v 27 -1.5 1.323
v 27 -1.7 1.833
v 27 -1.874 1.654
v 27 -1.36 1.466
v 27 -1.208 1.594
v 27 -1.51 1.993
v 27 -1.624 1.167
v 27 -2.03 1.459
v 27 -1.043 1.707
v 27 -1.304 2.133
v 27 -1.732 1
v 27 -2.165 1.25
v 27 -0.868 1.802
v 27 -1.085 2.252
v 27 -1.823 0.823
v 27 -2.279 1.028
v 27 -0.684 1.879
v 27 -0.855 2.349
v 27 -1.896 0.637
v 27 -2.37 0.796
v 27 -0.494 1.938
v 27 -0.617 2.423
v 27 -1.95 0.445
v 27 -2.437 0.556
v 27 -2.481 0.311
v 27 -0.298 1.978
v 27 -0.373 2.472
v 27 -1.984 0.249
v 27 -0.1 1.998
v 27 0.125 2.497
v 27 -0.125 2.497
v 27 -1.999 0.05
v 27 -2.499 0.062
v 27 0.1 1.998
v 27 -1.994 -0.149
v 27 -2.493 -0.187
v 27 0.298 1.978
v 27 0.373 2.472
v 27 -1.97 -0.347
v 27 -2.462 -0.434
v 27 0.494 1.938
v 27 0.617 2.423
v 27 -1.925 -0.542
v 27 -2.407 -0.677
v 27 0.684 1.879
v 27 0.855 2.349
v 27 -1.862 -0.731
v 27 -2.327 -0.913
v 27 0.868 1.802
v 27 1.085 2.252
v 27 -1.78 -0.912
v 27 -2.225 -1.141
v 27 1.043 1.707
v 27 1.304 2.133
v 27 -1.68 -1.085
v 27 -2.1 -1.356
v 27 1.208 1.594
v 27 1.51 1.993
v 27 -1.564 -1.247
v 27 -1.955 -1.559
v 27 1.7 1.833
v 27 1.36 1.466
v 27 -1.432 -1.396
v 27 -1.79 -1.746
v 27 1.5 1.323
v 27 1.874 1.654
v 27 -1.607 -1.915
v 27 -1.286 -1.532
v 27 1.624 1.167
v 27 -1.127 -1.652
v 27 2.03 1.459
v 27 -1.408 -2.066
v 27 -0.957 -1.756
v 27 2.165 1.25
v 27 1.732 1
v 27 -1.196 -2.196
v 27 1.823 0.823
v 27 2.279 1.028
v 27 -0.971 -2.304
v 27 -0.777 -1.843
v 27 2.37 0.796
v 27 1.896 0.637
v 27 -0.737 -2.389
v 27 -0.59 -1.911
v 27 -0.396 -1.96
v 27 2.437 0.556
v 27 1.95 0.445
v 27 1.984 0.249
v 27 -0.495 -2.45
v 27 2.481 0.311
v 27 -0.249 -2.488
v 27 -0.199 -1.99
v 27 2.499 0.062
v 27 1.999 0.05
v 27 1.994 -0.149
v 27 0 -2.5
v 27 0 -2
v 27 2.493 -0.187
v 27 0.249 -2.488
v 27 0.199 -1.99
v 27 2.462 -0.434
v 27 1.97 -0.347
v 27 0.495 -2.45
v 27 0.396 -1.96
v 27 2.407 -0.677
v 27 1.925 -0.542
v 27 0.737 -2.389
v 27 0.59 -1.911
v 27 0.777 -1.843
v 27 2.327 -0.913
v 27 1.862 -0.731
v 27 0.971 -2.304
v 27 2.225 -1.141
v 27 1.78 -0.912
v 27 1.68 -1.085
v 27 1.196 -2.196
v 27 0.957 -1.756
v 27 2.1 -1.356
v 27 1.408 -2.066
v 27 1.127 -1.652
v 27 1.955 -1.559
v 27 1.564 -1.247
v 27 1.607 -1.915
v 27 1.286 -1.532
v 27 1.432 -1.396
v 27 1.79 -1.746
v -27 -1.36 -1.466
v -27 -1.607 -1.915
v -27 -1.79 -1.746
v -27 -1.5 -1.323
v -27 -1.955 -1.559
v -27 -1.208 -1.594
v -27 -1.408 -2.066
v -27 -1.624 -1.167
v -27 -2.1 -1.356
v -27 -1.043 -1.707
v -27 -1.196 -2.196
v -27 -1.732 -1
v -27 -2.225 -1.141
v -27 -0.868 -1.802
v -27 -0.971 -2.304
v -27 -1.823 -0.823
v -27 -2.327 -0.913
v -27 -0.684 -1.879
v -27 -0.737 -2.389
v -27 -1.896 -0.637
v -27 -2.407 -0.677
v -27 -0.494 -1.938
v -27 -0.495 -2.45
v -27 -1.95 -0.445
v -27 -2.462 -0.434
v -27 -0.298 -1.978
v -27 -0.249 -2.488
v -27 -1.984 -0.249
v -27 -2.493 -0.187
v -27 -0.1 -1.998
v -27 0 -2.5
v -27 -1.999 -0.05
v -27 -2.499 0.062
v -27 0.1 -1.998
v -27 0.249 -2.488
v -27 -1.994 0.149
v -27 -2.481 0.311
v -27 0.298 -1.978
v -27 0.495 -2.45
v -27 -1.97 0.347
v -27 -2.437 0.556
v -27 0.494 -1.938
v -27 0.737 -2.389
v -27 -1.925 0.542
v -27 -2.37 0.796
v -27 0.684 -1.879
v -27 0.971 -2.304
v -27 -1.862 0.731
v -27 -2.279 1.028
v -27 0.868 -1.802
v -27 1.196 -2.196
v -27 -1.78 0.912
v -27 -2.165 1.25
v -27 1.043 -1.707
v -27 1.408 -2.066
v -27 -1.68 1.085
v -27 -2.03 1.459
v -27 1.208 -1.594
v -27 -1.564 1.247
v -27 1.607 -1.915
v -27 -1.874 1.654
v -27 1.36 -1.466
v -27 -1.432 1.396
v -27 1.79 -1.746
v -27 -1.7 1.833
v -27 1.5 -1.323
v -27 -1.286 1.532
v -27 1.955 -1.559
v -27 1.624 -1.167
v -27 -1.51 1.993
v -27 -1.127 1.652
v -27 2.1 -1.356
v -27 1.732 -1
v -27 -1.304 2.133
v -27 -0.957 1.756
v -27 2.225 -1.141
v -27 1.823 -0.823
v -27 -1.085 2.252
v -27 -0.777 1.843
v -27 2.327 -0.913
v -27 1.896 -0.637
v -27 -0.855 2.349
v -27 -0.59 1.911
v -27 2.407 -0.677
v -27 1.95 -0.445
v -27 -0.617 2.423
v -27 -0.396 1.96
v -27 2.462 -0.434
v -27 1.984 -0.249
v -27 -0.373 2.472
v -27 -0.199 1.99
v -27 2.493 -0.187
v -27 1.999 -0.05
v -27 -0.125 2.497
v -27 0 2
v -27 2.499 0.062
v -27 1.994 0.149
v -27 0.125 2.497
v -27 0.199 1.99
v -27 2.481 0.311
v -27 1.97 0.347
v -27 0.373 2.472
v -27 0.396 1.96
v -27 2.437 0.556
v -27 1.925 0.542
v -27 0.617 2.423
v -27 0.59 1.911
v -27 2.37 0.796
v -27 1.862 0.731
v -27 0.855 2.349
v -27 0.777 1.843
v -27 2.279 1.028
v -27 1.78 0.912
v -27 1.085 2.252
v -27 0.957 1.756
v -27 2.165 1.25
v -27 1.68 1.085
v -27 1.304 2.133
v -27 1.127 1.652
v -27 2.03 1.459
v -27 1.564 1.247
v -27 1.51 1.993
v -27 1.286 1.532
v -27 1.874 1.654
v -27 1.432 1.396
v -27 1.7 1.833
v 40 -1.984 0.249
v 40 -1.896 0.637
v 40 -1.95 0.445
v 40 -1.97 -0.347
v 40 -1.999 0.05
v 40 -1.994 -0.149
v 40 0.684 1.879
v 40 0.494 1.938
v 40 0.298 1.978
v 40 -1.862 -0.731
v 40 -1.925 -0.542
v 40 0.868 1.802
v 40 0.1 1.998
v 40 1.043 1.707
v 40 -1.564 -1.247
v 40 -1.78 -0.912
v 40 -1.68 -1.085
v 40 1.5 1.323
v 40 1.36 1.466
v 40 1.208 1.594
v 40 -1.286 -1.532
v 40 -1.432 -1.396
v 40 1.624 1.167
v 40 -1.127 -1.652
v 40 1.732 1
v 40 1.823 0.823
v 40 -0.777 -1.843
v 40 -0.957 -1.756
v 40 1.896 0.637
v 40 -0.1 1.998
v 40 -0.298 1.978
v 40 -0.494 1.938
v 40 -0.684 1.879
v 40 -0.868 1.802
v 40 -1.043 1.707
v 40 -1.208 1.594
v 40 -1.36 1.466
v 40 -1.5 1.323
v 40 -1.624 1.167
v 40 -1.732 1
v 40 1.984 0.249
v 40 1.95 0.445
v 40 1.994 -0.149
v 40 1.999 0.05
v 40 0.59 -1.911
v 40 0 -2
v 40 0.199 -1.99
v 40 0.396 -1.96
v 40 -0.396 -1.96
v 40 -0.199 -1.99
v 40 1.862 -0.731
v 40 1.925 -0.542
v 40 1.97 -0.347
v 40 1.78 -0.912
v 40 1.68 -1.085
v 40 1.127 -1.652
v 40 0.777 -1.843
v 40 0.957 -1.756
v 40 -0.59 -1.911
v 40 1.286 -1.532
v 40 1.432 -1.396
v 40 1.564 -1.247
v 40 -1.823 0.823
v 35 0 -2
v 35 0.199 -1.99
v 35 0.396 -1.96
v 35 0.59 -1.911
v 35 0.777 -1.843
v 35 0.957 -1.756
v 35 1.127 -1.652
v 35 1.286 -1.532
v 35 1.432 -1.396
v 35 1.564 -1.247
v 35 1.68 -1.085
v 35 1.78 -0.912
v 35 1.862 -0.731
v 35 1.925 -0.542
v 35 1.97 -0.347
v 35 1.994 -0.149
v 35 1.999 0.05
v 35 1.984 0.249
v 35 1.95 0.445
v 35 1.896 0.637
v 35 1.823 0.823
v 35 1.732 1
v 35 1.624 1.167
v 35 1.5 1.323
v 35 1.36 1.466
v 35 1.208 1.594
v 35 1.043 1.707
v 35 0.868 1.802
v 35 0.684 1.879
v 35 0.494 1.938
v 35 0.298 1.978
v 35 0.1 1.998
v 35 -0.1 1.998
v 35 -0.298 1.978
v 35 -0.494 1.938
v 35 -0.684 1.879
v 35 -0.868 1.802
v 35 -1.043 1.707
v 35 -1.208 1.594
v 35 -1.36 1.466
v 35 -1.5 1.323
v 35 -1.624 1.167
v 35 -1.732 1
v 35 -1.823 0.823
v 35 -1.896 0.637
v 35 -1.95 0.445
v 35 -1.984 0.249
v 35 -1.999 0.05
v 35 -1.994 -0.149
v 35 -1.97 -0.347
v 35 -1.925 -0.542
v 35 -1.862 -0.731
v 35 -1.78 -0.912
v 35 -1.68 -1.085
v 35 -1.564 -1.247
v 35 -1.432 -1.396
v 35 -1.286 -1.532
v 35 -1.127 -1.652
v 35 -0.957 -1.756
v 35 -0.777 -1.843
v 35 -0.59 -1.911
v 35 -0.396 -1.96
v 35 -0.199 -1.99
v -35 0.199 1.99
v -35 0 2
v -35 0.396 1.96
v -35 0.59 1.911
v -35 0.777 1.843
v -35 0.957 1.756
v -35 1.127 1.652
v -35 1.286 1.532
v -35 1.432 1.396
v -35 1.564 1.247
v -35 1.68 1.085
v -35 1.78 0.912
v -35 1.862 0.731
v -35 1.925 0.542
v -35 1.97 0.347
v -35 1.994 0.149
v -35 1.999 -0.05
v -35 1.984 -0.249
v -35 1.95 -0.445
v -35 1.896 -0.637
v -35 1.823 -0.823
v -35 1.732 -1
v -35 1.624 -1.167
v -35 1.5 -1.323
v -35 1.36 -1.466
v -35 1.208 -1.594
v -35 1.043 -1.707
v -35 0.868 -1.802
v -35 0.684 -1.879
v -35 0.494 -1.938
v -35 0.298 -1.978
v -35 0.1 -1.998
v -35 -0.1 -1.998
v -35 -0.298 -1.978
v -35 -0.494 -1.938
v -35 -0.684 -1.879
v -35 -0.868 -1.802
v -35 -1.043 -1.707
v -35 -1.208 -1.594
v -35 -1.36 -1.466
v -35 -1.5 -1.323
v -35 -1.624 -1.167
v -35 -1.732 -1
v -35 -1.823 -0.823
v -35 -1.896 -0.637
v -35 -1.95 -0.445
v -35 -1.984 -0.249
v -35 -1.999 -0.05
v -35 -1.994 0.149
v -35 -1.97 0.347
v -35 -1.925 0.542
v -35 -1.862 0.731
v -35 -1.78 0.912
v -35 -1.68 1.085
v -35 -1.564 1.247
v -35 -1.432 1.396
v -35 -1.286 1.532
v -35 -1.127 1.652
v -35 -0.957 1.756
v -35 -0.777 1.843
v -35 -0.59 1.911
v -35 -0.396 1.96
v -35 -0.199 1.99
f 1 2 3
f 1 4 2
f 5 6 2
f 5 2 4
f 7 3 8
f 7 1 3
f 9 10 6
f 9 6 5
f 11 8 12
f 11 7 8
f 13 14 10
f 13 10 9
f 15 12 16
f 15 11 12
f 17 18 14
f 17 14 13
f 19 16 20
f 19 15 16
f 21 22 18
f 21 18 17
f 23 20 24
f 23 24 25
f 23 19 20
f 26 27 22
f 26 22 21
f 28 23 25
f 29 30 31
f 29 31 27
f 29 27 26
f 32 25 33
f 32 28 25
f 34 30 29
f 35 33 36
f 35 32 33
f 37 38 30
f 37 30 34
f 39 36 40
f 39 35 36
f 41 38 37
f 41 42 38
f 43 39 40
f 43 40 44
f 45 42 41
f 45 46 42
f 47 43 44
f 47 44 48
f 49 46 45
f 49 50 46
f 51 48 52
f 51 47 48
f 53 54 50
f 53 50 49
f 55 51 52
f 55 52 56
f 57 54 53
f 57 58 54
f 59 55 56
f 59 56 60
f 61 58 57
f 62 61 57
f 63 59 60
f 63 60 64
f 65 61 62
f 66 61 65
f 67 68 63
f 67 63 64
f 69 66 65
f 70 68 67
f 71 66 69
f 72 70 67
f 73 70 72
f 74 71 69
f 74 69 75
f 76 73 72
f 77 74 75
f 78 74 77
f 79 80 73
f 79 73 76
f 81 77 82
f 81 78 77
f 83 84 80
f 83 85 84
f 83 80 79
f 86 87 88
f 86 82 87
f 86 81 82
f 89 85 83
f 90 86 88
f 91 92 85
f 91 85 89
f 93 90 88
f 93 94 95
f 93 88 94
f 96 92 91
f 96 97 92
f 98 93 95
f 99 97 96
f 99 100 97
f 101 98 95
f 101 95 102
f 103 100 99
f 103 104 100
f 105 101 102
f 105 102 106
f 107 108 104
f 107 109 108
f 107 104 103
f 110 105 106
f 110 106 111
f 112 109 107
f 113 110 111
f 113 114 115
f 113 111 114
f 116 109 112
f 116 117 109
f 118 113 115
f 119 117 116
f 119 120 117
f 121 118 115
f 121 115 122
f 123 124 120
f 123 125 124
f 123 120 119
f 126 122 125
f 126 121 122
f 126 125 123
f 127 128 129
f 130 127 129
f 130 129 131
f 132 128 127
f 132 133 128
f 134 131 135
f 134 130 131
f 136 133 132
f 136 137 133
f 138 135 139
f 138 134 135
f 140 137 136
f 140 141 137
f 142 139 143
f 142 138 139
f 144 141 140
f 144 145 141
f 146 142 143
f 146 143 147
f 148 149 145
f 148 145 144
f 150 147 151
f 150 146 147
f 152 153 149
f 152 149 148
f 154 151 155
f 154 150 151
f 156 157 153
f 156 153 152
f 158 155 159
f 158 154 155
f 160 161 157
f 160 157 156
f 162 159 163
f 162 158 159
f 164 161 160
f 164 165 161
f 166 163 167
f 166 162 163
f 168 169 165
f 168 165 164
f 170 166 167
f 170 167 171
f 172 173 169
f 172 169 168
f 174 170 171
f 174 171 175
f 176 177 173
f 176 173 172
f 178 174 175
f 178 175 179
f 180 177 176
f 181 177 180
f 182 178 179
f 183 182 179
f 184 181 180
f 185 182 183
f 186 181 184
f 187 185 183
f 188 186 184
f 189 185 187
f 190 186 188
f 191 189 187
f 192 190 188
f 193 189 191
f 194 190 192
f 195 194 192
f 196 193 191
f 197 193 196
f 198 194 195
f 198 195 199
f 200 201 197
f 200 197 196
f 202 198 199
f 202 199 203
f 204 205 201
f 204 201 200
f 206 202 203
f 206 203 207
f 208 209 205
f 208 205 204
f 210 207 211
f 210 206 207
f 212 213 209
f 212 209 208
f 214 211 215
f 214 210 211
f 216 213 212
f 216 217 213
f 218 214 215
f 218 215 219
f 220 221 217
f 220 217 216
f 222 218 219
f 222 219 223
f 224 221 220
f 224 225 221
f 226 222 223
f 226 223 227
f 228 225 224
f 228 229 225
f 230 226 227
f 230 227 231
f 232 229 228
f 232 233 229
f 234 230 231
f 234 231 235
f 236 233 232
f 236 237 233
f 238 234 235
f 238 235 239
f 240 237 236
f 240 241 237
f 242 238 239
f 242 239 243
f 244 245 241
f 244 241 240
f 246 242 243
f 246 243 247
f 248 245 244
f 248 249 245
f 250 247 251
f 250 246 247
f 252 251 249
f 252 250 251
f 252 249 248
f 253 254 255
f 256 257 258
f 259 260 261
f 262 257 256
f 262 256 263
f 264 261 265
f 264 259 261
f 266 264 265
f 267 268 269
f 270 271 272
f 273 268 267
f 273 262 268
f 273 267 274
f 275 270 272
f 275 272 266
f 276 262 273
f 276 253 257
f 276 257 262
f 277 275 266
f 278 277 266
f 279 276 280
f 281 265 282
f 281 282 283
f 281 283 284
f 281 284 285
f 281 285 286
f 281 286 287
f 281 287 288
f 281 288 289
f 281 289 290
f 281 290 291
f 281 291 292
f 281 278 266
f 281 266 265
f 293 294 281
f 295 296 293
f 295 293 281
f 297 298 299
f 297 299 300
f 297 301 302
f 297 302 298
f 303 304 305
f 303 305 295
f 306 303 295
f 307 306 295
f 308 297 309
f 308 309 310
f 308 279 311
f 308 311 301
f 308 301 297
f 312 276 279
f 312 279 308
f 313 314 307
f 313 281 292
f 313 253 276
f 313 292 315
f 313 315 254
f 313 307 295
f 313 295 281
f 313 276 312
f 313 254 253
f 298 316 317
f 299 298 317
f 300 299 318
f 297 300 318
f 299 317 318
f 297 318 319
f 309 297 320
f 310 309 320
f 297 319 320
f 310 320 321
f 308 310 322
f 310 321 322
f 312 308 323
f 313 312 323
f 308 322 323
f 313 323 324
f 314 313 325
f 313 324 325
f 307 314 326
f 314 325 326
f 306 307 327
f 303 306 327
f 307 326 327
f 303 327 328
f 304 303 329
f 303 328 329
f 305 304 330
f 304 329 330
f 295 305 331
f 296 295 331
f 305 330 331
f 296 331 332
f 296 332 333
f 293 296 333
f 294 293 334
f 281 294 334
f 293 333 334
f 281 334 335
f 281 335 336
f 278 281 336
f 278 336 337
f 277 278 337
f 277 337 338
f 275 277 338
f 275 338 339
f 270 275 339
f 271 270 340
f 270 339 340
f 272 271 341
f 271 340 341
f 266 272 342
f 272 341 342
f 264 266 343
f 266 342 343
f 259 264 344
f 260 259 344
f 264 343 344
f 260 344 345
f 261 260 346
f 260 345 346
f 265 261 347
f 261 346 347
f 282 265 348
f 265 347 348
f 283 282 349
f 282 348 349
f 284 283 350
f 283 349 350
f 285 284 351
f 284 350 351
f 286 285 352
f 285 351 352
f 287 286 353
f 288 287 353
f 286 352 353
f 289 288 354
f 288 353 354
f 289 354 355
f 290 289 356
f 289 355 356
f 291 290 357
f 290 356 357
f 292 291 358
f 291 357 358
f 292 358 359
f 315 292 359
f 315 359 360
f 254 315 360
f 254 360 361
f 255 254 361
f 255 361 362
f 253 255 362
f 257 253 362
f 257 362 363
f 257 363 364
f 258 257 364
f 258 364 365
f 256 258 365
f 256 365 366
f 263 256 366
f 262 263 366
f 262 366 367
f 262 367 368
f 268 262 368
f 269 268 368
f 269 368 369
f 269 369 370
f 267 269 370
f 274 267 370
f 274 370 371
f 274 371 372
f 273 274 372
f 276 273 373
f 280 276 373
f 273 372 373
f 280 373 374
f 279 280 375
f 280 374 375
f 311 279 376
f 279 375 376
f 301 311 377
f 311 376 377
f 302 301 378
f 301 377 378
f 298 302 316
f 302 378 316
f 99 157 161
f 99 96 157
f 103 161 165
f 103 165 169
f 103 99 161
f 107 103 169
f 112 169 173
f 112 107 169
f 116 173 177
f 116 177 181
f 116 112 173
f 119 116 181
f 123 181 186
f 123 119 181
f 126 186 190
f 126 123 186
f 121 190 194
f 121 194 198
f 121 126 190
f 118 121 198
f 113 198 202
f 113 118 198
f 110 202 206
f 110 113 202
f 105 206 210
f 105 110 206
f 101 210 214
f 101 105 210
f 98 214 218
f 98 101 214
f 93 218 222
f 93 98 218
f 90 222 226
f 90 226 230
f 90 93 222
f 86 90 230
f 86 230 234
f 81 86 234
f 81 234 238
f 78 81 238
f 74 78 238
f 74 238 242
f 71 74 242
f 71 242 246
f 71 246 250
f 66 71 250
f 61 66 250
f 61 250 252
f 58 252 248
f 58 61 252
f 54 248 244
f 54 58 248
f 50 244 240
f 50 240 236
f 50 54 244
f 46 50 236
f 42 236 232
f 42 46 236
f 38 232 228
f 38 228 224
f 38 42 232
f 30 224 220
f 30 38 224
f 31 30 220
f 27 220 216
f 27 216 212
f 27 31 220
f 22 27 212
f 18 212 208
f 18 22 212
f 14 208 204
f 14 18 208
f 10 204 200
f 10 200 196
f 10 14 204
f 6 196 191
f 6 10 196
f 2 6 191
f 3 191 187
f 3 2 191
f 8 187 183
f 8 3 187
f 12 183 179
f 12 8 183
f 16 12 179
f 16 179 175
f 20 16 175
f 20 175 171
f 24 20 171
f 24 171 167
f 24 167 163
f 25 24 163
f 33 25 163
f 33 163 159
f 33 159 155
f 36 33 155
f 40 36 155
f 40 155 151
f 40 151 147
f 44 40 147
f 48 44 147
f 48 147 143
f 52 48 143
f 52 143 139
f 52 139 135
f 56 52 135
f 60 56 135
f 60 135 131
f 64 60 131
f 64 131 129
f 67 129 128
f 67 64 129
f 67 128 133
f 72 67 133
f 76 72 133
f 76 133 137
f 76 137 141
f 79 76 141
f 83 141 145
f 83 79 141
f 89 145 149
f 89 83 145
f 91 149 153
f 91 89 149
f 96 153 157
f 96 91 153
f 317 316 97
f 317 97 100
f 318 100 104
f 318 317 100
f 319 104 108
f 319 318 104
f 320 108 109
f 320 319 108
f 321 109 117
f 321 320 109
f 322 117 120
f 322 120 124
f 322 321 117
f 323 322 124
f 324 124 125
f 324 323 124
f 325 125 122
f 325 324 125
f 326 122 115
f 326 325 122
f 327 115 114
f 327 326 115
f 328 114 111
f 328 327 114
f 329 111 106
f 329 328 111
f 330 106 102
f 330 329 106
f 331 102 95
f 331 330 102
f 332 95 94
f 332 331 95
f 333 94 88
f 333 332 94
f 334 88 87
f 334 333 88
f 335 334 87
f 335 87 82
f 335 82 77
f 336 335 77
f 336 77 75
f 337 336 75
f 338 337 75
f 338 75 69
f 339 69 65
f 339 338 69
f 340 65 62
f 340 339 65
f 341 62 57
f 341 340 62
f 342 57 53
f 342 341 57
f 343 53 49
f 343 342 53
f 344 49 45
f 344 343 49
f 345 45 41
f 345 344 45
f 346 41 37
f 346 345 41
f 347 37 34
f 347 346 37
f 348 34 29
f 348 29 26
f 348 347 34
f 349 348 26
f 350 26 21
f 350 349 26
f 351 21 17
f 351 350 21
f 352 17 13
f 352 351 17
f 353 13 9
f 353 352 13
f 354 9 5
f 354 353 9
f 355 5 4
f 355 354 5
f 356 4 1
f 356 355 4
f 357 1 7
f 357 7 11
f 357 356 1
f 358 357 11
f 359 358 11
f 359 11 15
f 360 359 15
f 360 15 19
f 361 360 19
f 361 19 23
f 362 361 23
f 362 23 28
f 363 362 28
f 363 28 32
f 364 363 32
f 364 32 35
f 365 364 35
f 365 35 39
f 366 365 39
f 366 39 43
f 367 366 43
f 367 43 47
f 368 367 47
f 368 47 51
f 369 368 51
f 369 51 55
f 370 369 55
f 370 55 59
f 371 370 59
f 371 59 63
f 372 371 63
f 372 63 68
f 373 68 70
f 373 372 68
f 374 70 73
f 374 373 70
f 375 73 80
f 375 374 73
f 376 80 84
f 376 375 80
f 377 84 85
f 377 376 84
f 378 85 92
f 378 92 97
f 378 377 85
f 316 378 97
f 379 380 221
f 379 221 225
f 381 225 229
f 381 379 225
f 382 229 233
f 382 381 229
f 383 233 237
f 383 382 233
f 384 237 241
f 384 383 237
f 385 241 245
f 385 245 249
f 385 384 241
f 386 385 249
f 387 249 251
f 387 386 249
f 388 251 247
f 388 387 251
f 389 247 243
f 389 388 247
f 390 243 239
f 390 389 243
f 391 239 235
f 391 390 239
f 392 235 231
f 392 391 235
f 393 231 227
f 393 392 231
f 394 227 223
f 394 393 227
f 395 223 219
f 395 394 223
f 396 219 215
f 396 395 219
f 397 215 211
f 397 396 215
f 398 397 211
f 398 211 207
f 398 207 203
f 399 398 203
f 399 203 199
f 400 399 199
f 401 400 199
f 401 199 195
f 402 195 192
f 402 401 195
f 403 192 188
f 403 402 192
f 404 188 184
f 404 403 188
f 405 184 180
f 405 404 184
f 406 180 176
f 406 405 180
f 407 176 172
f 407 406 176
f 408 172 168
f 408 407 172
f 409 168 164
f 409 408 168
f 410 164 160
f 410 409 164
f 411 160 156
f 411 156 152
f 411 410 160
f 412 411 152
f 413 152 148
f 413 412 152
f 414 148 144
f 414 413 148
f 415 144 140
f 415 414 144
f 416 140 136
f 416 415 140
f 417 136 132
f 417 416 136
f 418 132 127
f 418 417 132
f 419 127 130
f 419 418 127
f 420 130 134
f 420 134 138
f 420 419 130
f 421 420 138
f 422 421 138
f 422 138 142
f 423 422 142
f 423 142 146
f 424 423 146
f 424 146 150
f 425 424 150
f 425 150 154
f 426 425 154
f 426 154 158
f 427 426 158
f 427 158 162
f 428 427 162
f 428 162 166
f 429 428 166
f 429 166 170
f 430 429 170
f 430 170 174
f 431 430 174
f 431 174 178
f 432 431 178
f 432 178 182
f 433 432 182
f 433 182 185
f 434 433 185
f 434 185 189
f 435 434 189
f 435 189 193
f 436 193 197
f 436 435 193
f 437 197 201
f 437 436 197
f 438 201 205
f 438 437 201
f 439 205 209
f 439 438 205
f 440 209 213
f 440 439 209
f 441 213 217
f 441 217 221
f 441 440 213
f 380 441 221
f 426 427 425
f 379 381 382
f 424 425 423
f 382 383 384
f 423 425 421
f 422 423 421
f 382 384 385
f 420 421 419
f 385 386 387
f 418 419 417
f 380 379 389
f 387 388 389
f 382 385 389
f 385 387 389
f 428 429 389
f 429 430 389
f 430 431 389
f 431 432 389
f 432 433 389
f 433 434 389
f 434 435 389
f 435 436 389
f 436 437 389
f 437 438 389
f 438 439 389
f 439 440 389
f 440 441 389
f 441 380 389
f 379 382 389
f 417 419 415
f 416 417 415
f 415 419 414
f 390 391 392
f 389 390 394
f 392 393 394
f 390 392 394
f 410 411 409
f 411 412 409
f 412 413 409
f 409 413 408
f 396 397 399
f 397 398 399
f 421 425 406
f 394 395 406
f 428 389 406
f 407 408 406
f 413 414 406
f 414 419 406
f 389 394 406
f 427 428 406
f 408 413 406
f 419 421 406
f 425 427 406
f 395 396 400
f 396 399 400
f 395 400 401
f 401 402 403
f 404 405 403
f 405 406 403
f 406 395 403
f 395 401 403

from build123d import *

# Parameters (mm, degrees)
SKETCH1_R           = 2.5
BOSS_EXTRUDE1_DEPTH = 35
SKETCH2_R           = 2.5
SKETCH2_R_2         = 2
CUT_EXTRUDE1_DEPTH  = 8
SKETCH3_R           = 2.5
SKETCH3_R_2         = 2
CUT_EXTRUDE2_DEPTH  = 8
SKETCH4_R           = 2
BOSS_EXTRUDE2_DEPTH = 5


with BuildPart() as part:
    # Sketch1 → Boss-Extrude1 (new body, symmetric)
    with BuildSketch(Plane(origin=(0, 0, 0), x_dir=(0, 0, -1), z_dir=(1, 0, 0))):
        Circle(SKETCH1_R)
    extrude(amount=BOSS_EXTRUDE1_DEPTH, both=True)

    # Sketch2 → Cut-Extrude1 (cut)
    with BuildSketch(Plane(origin=(35, 0, 0), x_dir=(0, 0, -1), z_dir=(1, 0, 0))):
        Circle(SKETCH2_R)
        Circle(SKETCH2_R_2, mode=Mode.SUBTRACT)
    extrude(amount=-CUT_EXTRUDE1_DEPTH, mode=Mode.SUBTRACT)

    # Sketch3 → Cut-Extrude2 (cut)
    with BuildSketch(Plane.ZY.offset(35)):
        Circle(SKETCH3_R)
        Circle(SKETCH3_R_2, mode=Mode.SUBTRACT)
    extrude(amount=-CUT_EXTRUDE2_DEPTH, mode=Mode.SUBTRACT)

    # Sketch4 → Boss-Extrude2 (add)
    with BuildSketch(Plane(origin=(35, 0, 0), x_dir=(0, 0, -1), z_dir=(1, 0, 0))):
        Circle(SKETCH4_R)
    extrude(amount=BOSS_EXTRUDE2_DEPTH)


solid = part.part
